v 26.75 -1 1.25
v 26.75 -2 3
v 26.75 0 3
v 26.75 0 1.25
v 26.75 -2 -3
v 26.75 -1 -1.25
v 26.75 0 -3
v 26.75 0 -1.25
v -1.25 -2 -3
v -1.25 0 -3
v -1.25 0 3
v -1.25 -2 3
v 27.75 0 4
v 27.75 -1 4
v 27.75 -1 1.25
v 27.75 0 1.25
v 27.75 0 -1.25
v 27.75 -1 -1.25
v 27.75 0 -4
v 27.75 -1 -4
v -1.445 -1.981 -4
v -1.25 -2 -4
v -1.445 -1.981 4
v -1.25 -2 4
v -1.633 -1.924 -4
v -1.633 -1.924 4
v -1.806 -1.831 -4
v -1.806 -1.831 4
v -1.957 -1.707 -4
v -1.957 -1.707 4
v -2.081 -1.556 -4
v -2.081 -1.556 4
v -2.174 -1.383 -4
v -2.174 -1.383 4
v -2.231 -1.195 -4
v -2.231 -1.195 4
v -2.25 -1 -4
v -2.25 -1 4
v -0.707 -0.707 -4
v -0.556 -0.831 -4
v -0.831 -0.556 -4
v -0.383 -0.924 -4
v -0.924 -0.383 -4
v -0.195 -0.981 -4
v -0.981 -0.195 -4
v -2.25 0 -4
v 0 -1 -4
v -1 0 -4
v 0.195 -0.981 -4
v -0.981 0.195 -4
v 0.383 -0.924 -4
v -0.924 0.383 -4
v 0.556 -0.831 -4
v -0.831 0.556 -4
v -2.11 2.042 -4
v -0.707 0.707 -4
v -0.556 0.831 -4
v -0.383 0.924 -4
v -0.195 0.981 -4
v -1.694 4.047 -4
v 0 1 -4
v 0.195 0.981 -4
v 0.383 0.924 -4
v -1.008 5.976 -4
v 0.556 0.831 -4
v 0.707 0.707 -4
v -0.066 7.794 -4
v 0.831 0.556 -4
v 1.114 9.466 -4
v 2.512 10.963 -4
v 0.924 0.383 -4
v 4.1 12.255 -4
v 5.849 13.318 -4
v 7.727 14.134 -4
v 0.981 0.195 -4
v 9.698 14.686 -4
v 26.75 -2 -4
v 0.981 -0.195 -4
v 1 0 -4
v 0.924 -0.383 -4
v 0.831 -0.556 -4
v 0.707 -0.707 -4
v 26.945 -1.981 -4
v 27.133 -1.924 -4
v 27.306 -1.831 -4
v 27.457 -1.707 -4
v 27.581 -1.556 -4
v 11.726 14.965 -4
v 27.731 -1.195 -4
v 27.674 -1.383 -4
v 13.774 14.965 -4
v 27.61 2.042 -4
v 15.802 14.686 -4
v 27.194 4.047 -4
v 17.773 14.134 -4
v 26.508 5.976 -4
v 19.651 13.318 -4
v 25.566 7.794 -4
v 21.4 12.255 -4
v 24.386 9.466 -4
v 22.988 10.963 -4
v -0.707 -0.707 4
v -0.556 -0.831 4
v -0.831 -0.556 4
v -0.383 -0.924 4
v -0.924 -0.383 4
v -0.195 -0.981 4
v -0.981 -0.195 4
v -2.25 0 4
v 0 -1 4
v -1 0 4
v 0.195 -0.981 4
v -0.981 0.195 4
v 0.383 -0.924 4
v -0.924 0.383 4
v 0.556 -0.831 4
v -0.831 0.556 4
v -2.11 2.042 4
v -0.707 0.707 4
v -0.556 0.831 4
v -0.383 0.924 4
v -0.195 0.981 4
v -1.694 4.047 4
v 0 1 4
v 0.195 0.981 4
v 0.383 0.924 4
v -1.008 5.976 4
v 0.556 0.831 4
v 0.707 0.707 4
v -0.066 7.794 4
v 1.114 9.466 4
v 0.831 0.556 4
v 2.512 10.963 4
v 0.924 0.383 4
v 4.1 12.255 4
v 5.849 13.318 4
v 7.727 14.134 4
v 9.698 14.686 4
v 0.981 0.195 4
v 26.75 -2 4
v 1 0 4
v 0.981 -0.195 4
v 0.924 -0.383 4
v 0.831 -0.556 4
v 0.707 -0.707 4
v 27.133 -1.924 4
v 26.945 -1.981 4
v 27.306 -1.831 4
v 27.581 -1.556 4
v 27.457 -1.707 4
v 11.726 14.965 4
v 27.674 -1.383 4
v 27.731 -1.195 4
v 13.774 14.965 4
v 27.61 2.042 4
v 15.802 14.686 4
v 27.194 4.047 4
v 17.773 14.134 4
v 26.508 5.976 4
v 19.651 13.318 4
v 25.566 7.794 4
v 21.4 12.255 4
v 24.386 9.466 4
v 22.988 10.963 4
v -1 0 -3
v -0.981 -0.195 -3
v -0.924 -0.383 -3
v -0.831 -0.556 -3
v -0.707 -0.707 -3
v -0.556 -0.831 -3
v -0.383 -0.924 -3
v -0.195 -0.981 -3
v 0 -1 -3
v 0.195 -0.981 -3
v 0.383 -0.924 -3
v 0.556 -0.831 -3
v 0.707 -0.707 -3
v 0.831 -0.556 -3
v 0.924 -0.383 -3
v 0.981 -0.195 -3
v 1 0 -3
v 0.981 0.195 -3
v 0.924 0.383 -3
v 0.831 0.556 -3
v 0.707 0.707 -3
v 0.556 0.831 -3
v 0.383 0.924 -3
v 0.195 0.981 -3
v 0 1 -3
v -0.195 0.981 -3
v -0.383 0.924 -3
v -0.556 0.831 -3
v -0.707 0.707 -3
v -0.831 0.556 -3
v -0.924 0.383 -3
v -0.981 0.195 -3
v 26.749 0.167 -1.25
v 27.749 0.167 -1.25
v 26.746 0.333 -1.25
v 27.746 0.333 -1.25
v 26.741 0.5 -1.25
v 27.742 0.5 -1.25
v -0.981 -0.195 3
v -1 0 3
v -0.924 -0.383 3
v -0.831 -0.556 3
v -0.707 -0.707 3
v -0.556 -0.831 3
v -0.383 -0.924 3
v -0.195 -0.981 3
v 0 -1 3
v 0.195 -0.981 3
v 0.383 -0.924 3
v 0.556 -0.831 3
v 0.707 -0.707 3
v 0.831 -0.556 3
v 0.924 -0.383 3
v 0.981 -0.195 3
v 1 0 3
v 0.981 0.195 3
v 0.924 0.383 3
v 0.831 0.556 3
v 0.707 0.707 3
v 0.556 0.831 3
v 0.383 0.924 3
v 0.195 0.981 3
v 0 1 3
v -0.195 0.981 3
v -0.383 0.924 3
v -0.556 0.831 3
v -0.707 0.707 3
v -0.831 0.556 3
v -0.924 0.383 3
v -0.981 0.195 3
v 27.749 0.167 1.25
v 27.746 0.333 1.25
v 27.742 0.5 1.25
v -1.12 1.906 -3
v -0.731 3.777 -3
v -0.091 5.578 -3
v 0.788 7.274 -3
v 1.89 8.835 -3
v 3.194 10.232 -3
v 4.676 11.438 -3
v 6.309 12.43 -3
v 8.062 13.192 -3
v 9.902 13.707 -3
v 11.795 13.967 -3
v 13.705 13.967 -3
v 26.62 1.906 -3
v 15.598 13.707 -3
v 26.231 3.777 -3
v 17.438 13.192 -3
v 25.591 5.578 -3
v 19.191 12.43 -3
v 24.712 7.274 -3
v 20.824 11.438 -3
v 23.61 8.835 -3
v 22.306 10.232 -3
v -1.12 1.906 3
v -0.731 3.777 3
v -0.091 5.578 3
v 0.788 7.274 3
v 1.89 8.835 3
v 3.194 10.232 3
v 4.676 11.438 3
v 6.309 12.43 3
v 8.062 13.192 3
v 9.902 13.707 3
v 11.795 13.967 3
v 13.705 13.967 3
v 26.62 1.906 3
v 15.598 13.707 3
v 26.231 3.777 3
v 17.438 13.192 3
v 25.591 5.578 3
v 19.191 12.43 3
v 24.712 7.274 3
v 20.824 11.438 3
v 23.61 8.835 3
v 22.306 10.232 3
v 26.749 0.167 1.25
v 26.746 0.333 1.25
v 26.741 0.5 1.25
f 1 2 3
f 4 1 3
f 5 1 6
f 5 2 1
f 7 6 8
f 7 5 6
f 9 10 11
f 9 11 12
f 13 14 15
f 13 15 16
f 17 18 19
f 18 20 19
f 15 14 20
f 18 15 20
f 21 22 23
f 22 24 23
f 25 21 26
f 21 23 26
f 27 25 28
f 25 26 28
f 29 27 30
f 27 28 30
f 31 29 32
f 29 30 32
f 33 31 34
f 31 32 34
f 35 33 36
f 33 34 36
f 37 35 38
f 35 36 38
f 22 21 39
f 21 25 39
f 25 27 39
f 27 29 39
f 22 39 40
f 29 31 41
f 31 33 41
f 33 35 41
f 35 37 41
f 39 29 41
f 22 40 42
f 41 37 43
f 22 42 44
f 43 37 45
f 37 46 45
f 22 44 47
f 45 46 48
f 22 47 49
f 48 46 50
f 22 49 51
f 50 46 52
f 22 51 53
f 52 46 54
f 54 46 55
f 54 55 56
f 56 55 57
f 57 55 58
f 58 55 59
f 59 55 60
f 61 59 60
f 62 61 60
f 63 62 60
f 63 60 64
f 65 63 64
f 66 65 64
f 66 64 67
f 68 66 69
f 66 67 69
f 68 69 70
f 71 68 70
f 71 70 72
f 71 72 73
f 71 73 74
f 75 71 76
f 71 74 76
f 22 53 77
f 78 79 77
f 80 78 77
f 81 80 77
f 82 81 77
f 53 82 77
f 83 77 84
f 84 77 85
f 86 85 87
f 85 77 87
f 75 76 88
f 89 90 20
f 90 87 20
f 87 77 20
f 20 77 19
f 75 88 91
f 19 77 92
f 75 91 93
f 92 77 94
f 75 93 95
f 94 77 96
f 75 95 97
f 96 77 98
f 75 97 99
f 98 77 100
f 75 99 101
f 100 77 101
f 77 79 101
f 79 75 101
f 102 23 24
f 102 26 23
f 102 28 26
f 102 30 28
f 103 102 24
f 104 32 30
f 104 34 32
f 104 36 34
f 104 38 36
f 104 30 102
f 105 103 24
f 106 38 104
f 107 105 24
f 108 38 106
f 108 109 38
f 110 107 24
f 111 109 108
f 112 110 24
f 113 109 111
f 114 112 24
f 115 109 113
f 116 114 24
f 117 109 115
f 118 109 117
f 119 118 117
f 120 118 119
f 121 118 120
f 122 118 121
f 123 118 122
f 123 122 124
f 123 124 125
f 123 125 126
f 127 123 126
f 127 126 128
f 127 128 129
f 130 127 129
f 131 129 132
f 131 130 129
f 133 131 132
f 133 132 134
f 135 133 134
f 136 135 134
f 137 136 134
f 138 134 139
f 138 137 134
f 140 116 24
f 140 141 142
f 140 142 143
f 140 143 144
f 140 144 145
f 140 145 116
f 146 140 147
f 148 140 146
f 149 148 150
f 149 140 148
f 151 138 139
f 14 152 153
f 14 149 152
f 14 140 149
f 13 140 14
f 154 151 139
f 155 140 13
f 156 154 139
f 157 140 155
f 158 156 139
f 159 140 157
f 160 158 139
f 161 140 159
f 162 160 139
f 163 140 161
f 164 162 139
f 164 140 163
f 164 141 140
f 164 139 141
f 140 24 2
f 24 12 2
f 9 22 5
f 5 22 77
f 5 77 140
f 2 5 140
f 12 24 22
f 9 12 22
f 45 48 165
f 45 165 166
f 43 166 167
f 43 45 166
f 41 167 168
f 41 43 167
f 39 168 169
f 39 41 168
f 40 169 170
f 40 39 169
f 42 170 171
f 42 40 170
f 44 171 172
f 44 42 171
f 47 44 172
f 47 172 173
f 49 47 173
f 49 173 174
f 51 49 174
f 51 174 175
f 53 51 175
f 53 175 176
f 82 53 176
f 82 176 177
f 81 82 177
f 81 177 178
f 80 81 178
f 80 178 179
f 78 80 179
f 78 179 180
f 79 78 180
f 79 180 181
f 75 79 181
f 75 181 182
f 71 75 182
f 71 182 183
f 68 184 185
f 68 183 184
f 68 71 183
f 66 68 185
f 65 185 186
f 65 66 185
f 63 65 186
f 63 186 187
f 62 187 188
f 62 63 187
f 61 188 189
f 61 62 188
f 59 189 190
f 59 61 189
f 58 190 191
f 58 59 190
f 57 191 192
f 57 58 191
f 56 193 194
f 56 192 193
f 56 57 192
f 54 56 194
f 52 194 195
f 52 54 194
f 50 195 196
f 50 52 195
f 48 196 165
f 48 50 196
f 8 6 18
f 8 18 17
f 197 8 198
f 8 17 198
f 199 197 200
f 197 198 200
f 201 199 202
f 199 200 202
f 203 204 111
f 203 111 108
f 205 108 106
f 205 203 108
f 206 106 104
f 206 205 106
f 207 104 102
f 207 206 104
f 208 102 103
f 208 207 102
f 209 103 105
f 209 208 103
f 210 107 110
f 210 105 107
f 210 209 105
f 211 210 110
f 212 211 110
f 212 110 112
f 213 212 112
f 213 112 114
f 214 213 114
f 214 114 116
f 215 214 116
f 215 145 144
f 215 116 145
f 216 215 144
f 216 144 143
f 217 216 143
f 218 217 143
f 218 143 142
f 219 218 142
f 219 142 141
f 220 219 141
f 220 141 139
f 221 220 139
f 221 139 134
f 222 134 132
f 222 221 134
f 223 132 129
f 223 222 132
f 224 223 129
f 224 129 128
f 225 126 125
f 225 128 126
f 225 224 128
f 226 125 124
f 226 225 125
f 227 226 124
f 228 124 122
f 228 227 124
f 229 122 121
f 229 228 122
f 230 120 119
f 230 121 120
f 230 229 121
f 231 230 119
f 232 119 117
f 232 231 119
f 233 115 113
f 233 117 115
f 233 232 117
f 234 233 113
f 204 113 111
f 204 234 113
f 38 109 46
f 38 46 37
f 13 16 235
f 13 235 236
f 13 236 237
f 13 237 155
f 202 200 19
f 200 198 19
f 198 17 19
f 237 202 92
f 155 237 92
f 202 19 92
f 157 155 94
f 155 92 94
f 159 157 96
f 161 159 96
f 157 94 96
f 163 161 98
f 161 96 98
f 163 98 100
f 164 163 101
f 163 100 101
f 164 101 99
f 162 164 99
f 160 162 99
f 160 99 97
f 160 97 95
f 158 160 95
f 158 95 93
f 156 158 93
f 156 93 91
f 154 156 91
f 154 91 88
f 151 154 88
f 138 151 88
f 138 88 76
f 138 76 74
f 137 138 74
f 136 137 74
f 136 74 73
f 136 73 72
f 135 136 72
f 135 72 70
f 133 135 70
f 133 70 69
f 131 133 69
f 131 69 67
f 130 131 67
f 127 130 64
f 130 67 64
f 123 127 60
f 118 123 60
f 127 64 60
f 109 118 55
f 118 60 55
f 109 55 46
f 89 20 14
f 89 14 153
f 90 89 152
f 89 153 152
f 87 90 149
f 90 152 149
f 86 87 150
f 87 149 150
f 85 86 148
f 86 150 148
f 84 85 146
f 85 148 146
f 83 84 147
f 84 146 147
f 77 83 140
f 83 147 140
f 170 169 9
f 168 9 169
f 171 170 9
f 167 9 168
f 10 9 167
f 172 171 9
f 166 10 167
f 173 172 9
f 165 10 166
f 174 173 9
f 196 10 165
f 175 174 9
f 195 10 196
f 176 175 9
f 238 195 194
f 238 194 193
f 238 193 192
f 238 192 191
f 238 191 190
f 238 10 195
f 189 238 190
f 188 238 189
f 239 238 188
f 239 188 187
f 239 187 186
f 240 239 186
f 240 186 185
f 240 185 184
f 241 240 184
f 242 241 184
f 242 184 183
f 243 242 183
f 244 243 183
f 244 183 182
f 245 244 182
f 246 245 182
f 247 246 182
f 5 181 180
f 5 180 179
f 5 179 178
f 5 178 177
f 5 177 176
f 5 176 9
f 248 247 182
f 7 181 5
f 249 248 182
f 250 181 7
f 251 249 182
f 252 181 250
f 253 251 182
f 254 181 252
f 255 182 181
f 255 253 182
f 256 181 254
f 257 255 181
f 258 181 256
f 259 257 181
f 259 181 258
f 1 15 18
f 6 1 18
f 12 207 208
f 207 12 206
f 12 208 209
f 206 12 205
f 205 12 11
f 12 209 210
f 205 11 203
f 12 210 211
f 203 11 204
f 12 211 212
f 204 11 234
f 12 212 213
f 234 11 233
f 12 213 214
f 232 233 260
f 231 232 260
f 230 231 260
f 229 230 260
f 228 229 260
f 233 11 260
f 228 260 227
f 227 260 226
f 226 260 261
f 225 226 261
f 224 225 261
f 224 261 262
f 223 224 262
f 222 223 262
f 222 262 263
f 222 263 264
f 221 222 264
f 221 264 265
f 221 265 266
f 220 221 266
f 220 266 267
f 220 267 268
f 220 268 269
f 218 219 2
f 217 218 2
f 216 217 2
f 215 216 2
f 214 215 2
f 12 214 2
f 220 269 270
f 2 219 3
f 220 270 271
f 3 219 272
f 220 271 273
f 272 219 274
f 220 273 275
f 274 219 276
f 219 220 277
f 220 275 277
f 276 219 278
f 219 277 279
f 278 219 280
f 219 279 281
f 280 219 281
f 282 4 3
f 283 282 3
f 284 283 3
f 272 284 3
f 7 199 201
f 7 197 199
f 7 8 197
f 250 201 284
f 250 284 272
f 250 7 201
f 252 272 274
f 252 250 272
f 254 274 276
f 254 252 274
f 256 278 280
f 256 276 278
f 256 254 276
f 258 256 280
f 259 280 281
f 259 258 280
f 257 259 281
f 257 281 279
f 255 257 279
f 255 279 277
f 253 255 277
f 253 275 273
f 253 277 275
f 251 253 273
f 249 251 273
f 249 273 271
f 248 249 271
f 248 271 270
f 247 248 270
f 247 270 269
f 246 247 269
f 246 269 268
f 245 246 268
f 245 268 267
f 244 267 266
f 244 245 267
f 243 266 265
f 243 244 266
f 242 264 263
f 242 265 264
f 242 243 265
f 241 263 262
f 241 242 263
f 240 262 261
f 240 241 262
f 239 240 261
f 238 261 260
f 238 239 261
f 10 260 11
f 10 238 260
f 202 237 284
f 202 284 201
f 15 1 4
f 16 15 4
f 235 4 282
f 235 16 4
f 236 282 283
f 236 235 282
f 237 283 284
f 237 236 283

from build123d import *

# Parameters (mm, degrees)
BOSS_EXTRUDE1_DEPTH      = 4
BOSS_EXTRUDE1_DEPTH_BACK = 4
SHELL1_T                 = -1
CUT_EXTRUDE1_DEPTH       = 33.543240466
CUT_EXTRUDE1_DEPTH_BACK  = 33.543240466
SKETCH2_R                = 1
CUT_EXTRUDE2_REACH       = 35.779
CUT_EXTRUDE2_END_RADIUS  = 14
SKETCH3_W                = 2.5
SKETCH3_H                = 1.5
FILLET2_R                = 1


with BuildPart() as part:
    # Sketch1 → Boss-Extrude1 (new, two sides: drawn at the far end of the back side and taken through both)
    with BuildSketch(Plane.XY.offset(-BOSS_EXTRUDE1_DEPTH_BACK)):
        with BuildLine():
            Line((-2.25, -2), (27.75, -2))
            Line((27.75, -2), (27.75, 0))
            ThreePointArc((27.75, 0), (12.75, 15), (-2.25, 0))
            Line((-2.25, 0), (-2.25, -2))
        make_face()
    extrude(amount=BOSS_EXTRUDE1_DEPTH + BOSS_EXTRUDE1_DEPTH_BACK)

    # Shell1
    shell1_openings = [part.faces().sort_by_distance(p)[0] for p in [
        (12.75, -2, 0),
    ]]
    offset(amount=SHELL1_T, openings=shell1_openings, kind=Kind.INTERSECTION)

    # Sketch2 → Cut-Extrude1 (cut, two sides: drawn at the far end of the back side and taken through both)
    with BuildSketch(Plane.XY.offset(4).offset(-CUT_EXTRUDE1_DEPTH_BACK)):
        with Locations(Location((0, 0, 0), (0, 0, 180))):
            Circle(SKETCH2_R)
    extrude(amount=CUT_EXTRUDE1_DEPTH + CUT_EXTRUDE1_DEPTH_BACK, mode=Mode.SUBTRACT)

    # Cut-Extrude2: up to this cylinder (the profile starts outside it)
    cut_extrude2_end = Plane(origin=(12.75, 0, 0), z_dir=(0, 0, 1)) * Cylinder(CUT_EXTRUDE2_END_RADIUS, 100.558, mode=Mode.PRIVATE)
    # Sketch3 → Cut-Extrude2 (cut, up to the surface)
    with BuildSketch(Plane(origin=(27.75, 0, 0), x_dir=(0, 0, -1), z_dir=(1, 0, 0)), mode=Mode.PRIVATE) as cut_extrude2_sk1:
        with Locations((0, -0.25)):
            Rectangle(SKETCH3_W, SKETCH3_H)
    cut_extrude2_tool1 = extrude(cut_extrude2_sk1.sketch, amount=-CUT_EXTRUDE2_REACH, mode=Mode.PRIVATE) - cut_extrude2_end
    add(cut_extrude2_tool1.solids().sort_by_distance((27.75, -0.25, 0))[0], mode=Mode.SUBTRACT)

    # Fillet2
    fillet2_edges = [part.edges().sort_by_distance(p)[0] for p in [
        (27.75, -2, 0),
        (-2.25, -2, 0),
    ]]
    fillet(fillet2_edges, radius=FILLET2_R - 0.0001)  # a hair under: the kernel refuses the full size


solid = part.part
